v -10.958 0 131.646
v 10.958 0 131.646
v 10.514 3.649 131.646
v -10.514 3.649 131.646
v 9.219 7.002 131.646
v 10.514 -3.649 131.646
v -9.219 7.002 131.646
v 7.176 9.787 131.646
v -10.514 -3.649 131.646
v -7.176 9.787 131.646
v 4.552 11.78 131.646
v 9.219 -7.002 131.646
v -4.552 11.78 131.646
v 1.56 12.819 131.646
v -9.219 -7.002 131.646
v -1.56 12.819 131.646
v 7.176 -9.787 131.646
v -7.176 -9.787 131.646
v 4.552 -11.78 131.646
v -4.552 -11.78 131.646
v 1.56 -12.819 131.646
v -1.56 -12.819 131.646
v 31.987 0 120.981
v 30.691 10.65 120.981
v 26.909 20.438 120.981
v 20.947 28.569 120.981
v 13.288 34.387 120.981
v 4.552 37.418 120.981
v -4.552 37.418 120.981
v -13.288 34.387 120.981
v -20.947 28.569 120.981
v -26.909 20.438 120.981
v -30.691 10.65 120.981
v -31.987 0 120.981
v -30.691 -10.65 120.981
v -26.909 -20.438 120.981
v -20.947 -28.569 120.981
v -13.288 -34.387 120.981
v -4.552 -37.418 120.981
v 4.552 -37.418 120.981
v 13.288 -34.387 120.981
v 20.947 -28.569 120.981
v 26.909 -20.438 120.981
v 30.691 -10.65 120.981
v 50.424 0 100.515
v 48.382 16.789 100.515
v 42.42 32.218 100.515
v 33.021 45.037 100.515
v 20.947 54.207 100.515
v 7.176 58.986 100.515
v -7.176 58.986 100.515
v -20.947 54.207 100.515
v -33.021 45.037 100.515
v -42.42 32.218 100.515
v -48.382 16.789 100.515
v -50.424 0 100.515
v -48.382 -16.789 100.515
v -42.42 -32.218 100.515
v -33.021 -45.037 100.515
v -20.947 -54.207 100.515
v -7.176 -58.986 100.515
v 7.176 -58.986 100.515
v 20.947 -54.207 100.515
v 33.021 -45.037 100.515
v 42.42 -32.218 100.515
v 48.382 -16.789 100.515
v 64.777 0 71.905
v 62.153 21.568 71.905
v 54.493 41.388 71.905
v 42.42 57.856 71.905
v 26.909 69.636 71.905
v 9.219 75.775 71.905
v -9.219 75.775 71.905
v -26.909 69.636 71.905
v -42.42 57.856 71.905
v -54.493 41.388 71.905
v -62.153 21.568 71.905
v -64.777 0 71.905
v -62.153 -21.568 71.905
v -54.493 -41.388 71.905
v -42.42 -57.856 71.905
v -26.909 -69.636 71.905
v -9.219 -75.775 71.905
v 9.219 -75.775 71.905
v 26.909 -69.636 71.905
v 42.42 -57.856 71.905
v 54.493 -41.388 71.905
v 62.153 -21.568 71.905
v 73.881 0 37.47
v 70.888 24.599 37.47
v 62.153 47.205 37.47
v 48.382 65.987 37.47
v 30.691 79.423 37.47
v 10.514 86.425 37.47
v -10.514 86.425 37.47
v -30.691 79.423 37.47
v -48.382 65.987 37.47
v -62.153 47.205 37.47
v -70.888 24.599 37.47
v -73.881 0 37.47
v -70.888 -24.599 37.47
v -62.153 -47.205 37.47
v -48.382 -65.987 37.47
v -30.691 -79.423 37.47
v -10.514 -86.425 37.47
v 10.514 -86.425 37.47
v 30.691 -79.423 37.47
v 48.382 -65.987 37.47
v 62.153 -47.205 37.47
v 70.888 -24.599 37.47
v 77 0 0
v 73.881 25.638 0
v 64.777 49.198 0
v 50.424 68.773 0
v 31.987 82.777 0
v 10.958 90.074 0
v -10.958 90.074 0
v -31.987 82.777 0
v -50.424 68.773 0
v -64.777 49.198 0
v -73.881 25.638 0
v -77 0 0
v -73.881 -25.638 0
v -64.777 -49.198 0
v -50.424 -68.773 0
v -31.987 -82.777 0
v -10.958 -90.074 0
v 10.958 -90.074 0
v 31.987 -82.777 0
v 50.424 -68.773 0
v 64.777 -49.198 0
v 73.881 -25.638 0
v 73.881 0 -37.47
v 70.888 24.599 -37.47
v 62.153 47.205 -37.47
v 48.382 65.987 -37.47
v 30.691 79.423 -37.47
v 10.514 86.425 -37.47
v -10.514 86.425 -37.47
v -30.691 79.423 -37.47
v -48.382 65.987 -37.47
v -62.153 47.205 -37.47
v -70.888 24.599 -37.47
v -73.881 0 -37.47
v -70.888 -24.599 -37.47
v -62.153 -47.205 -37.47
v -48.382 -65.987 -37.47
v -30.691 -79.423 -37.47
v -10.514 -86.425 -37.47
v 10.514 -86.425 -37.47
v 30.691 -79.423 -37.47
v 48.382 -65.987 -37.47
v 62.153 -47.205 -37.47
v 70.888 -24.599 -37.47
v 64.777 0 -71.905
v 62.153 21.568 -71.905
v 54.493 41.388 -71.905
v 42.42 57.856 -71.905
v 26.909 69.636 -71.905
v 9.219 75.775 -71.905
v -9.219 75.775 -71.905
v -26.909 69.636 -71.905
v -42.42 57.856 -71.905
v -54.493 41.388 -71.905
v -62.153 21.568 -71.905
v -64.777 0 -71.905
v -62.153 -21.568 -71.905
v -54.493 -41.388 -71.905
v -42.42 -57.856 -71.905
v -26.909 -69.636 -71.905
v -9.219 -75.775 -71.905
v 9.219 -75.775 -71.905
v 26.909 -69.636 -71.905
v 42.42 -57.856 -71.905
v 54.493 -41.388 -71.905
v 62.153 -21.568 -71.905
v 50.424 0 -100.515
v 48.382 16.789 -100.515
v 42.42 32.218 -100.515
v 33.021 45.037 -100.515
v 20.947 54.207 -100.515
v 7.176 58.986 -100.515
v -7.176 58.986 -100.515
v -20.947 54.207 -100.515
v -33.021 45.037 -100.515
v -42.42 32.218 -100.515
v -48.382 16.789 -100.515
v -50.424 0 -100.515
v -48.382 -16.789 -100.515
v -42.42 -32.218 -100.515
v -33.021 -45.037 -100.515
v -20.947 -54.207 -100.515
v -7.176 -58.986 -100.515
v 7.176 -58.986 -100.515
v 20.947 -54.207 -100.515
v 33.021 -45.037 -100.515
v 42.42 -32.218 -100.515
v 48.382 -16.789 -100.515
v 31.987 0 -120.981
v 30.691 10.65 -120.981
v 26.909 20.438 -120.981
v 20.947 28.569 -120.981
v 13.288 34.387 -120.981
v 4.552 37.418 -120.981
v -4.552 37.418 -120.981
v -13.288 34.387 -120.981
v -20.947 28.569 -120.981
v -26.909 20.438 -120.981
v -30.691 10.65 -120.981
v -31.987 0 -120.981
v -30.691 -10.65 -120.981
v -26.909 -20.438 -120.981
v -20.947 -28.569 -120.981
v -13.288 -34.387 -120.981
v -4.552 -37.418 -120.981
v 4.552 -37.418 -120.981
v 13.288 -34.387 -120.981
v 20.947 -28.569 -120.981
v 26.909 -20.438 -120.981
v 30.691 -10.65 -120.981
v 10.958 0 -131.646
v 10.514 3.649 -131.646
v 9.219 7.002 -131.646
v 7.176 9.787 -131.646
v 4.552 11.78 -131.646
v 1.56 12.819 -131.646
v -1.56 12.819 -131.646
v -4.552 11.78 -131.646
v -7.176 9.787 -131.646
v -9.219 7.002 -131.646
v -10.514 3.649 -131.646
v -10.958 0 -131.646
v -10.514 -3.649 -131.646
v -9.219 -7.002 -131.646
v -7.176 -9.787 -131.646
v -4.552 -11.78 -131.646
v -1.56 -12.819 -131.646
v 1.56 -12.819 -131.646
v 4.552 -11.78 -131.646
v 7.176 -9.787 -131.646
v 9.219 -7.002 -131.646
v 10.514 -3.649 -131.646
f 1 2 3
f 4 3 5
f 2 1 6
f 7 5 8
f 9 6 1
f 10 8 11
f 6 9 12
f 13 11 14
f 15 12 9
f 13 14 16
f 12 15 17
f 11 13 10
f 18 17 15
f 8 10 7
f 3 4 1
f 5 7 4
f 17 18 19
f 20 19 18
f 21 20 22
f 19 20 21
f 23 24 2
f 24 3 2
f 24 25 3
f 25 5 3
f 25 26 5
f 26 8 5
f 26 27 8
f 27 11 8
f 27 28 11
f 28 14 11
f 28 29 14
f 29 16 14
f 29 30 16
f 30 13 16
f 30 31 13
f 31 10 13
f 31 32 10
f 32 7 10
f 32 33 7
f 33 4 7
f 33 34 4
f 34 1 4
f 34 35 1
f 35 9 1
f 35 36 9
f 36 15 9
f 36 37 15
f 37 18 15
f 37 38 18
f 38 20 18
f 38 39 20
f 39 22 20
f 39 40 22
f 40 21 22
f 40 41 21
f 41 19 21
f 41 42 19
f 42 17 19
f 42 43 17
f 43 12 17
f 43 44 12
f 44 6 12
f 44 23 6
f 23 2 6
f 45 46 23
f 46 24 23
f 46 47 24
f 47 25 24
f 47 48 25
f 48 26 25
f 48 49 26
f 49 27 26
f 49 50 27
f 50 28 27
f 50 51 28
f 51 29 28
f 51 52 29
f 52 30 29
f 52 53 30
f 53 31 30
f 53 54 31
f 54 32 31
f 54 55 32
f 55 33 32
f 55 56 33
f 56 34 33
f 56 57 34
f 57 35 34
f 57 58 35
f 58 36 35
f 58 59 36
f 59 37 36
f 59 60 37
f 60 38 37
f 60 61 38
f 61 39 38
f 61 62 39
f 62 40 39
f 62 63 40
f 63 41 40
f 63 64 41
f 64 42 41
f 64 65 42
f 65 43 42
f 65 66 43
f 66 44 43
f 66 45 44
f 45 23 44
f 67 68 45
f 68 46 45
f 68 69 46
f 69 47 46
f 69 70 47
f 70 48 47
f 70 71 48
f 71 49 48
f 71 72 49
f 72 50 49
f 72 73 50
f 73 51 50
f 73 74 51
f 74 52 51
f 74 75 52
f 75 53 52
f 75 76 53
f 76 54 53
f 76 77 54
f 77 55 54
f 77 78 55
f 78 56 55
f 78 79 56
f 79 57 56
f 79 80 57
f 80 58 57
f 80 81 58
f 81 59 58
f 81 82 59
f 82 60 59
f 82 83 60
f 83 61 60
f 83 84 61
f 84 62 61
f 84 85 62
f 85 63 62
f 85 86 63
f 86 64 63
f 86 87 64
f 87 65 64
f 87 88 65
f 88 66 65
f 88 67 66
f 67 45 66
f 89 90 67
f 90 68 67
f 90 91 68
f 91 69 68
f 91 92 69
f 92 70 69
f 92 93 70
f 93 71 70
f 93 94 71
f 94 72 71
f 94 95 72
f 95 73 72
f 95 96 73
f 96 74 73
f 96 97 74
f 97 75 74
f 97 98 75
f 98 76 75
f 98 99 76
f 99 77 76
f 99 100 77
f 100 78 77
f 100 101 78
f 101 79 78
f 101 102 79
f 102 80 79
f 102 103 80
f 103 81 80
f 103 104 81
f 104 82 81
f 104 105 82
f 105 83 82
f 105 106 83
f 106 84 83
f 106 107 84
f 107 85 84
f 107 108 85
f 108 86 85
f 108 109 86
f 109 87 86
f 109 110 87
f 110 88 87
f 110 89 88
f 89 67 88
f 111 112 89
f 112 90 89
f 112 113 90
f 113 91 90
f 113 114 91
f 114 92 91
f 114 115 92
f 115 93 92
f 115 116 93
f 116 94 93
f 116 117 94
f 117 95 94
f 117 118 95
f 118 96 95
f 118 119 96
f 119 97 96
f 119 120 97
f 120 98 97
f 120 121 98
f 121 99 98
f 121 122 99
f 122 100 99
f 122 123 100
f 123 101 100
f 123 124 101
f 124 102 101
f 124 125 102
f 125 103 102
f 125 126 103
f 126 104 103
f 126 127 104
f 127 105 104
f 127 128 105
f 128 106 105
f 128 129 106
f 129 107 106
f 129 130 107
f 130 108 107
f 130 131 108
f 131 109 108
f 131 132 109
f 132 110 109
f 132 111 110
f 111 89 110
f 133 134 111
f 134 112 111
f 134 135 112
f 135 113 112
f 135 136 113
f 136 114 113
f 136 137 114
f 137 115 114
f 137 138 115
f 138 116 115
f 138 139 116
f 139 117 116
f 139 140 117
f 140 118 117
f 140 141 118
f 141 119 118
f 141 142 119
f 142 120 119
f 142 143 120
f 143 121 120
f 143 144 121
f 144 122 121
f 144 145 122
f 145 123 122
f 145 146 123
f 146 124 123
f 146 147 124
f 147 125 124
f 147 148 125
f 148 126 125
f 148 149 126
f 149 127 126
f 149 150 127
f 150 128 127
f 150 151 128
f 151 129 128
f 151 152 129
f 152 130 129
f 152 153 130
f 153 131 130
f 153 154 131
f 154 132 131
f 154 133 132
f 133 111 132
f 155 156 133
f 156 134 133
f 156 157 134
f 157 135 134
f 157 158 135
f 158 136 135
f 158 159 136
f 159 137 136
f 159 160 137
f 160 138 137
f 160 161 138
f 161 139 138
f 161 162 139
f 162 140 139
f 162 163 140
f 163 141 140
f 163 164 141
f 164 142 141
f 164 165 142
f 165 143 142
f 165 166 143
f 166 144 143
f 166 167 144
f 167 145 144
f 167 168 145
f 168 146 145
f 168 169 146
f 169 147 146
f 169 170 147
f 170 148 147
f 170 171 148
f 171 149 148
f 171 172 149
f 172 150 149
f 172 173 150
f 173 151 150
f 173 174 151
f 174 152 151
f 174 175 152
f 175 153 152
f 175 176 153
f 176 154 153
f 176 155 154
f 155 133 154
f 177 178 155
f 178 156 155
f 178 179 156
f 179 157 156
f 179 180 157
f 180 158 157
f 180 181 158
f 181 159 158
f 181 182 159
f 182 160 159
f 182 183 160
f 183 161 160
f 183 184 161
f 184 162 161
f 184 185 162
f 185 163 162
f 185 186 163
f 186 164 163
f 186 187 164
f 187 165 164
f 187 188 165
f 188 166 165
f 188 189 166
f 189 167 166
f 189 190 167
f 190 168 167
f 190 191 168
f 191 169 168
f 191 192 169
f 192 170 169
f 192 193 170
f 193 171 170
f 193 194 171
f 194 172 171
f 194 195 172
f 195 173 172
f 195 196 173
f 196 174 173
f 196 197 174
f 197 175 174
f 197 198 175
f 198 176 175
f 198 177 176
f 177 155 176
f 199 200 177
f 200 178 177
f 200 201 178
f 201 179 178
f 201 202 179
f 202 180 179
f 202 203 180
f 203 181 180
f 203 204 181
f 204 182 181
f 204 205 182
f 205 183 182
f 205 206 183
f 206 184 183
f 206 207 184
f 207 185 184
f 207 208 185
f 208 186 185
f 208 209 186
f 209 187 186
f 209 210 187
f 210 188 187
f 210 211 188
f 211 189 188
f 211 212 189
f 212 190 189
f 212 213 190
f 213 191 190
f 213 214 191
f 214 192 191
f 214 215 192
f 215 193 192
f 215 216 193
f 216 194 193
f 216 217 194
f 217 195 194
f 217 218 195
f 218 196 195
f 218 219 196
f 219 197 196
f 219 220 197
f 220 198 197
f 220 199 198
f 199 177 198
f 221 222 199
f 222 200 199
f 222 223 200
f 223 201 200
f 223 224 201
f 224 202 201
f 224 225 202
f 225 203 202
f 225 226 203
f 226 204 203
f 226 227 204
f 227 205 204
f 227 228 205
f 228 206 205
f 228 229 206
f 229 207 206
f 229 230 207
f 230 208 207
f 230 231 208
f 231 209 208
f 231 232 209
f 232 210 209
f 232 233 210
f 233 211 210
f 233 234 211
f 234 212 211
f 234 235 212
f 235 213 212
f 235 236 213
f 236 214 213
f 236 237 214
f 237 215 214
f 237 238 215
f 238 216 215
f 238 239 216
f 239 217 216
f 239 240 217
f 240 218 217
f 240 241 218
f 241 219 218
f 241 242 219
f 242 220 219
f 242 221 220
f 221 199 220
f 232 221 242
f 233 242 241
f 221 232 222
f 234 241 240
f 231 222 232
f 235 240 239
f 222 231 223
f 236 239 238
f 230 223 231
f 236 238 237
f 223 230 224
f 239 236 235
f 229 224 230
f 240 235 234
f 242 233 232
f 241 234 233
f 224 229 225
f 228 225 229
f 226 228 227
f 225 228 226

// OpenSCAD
// Generated by SolidPython 1.0.1 on 2020-07-29 00:46:49


scale(v = [11, 13, 19]) {
	sphere(r = 7);
}
/***********************************************
*********      SolidPython code:      **********
************************************************
 
# import packages: SolidPython
from solid import *
from solid.utils import *
from itertools import chain, combinations, permutations


class Resize:

    def __init__(self, scad_file):
        self.scad_file = scad_file
        #self.scad_file = import_scad(scad_file)
        # cone/cylinder param:
        self.r1 = 0
        self.r2 = 0
        self.h = 0
        # rectangular prism param:
        self.w = 0
        self.l = 0
        # ellipse param:
        self.r = 0

    # import OpenScad code (file name corresponds to shape)


    # classify shape + parameters
    def assign(self, param1, param2, param3):
        if self.scad_file == 'cone.scad':
            self.r1 = param1
            self.r2 = param2
            self.h = param3
        elif self.scad_file == 'cylinder.scad':
            self.r1 = param1
            self.r2 = param2
            self.h = param3
        elif self.scad_file == 'rectangularPrism.scad':
            self.h = param1
            self.l = param2
            self.w = param3
        else:
            self.r = param1
            self.h = param2

    # resize parameters
    def iterate(self):
        x = range(3, 20, 2)
        i = 1
        if self.scad_file == 'cone.scad':
            tempList = list(permutations(x, 2))
            for temp in tempList:
                param1 = temp[0]
                param2 = temp[1]
                filepath = 'produced_scad_files/' + 'cone' + str(param1) + '_' + str(param2) + '_' + '.scad'
                scad_render_to_file(cylinder(h=param1, r1=param2, r2=0), filepath)

        elif self.scad_file == 'cylinder.scad':
            tempList = list(permutations(x, 3))
            for temp in tempList:
                param1 = temp[0]
                param2 = temp[1]
                filepath = 'produced_scad_files/' + 'cylinder' + str(param1) + '_' + str(param2) + '_' + '.scad'
                scad_render_to_file(cylinder(h=param1, r1=param2, r2=param2), filepath)

        elif self.scad_file == 'rectangularPrism.scad':
            tempList = list(permutations(x, 3))
            for temp in tempList:
                param1 = temp[0]
                param2 = temp[1]
                param3 = temp[2]
                filepath = 'produced_scad_files/' + 'rectangularPrism' + str(param1) + '_' + str(param2) + '_' + str(
                    param3) + '.scad'
                scad_render_to_file(cube(size=(param1, param2, param3)), filepath)

        elif self.scad_file == 'ellipse.scad':
            tempList = list(permutations(x, 4))
            for temp in tempList:
                param1 = temp[0]
                param2 = temp[1]
                param3 = temp[2]
                param4 = temp[3]
                filepath = 'produced_scad_files/' + 'ellipse' + str(param1) + '_' + str(param2) + '_' + str(param3) + '_' + str(param4) + '.scad'
                scad_render_to_file(scale([param1, param2, param3])(sphere(r=param4)), filepath)

    def render_to_scadfile(self):
        scad_render_to_file(scad, 'example.scad') 
 
************************************************/
